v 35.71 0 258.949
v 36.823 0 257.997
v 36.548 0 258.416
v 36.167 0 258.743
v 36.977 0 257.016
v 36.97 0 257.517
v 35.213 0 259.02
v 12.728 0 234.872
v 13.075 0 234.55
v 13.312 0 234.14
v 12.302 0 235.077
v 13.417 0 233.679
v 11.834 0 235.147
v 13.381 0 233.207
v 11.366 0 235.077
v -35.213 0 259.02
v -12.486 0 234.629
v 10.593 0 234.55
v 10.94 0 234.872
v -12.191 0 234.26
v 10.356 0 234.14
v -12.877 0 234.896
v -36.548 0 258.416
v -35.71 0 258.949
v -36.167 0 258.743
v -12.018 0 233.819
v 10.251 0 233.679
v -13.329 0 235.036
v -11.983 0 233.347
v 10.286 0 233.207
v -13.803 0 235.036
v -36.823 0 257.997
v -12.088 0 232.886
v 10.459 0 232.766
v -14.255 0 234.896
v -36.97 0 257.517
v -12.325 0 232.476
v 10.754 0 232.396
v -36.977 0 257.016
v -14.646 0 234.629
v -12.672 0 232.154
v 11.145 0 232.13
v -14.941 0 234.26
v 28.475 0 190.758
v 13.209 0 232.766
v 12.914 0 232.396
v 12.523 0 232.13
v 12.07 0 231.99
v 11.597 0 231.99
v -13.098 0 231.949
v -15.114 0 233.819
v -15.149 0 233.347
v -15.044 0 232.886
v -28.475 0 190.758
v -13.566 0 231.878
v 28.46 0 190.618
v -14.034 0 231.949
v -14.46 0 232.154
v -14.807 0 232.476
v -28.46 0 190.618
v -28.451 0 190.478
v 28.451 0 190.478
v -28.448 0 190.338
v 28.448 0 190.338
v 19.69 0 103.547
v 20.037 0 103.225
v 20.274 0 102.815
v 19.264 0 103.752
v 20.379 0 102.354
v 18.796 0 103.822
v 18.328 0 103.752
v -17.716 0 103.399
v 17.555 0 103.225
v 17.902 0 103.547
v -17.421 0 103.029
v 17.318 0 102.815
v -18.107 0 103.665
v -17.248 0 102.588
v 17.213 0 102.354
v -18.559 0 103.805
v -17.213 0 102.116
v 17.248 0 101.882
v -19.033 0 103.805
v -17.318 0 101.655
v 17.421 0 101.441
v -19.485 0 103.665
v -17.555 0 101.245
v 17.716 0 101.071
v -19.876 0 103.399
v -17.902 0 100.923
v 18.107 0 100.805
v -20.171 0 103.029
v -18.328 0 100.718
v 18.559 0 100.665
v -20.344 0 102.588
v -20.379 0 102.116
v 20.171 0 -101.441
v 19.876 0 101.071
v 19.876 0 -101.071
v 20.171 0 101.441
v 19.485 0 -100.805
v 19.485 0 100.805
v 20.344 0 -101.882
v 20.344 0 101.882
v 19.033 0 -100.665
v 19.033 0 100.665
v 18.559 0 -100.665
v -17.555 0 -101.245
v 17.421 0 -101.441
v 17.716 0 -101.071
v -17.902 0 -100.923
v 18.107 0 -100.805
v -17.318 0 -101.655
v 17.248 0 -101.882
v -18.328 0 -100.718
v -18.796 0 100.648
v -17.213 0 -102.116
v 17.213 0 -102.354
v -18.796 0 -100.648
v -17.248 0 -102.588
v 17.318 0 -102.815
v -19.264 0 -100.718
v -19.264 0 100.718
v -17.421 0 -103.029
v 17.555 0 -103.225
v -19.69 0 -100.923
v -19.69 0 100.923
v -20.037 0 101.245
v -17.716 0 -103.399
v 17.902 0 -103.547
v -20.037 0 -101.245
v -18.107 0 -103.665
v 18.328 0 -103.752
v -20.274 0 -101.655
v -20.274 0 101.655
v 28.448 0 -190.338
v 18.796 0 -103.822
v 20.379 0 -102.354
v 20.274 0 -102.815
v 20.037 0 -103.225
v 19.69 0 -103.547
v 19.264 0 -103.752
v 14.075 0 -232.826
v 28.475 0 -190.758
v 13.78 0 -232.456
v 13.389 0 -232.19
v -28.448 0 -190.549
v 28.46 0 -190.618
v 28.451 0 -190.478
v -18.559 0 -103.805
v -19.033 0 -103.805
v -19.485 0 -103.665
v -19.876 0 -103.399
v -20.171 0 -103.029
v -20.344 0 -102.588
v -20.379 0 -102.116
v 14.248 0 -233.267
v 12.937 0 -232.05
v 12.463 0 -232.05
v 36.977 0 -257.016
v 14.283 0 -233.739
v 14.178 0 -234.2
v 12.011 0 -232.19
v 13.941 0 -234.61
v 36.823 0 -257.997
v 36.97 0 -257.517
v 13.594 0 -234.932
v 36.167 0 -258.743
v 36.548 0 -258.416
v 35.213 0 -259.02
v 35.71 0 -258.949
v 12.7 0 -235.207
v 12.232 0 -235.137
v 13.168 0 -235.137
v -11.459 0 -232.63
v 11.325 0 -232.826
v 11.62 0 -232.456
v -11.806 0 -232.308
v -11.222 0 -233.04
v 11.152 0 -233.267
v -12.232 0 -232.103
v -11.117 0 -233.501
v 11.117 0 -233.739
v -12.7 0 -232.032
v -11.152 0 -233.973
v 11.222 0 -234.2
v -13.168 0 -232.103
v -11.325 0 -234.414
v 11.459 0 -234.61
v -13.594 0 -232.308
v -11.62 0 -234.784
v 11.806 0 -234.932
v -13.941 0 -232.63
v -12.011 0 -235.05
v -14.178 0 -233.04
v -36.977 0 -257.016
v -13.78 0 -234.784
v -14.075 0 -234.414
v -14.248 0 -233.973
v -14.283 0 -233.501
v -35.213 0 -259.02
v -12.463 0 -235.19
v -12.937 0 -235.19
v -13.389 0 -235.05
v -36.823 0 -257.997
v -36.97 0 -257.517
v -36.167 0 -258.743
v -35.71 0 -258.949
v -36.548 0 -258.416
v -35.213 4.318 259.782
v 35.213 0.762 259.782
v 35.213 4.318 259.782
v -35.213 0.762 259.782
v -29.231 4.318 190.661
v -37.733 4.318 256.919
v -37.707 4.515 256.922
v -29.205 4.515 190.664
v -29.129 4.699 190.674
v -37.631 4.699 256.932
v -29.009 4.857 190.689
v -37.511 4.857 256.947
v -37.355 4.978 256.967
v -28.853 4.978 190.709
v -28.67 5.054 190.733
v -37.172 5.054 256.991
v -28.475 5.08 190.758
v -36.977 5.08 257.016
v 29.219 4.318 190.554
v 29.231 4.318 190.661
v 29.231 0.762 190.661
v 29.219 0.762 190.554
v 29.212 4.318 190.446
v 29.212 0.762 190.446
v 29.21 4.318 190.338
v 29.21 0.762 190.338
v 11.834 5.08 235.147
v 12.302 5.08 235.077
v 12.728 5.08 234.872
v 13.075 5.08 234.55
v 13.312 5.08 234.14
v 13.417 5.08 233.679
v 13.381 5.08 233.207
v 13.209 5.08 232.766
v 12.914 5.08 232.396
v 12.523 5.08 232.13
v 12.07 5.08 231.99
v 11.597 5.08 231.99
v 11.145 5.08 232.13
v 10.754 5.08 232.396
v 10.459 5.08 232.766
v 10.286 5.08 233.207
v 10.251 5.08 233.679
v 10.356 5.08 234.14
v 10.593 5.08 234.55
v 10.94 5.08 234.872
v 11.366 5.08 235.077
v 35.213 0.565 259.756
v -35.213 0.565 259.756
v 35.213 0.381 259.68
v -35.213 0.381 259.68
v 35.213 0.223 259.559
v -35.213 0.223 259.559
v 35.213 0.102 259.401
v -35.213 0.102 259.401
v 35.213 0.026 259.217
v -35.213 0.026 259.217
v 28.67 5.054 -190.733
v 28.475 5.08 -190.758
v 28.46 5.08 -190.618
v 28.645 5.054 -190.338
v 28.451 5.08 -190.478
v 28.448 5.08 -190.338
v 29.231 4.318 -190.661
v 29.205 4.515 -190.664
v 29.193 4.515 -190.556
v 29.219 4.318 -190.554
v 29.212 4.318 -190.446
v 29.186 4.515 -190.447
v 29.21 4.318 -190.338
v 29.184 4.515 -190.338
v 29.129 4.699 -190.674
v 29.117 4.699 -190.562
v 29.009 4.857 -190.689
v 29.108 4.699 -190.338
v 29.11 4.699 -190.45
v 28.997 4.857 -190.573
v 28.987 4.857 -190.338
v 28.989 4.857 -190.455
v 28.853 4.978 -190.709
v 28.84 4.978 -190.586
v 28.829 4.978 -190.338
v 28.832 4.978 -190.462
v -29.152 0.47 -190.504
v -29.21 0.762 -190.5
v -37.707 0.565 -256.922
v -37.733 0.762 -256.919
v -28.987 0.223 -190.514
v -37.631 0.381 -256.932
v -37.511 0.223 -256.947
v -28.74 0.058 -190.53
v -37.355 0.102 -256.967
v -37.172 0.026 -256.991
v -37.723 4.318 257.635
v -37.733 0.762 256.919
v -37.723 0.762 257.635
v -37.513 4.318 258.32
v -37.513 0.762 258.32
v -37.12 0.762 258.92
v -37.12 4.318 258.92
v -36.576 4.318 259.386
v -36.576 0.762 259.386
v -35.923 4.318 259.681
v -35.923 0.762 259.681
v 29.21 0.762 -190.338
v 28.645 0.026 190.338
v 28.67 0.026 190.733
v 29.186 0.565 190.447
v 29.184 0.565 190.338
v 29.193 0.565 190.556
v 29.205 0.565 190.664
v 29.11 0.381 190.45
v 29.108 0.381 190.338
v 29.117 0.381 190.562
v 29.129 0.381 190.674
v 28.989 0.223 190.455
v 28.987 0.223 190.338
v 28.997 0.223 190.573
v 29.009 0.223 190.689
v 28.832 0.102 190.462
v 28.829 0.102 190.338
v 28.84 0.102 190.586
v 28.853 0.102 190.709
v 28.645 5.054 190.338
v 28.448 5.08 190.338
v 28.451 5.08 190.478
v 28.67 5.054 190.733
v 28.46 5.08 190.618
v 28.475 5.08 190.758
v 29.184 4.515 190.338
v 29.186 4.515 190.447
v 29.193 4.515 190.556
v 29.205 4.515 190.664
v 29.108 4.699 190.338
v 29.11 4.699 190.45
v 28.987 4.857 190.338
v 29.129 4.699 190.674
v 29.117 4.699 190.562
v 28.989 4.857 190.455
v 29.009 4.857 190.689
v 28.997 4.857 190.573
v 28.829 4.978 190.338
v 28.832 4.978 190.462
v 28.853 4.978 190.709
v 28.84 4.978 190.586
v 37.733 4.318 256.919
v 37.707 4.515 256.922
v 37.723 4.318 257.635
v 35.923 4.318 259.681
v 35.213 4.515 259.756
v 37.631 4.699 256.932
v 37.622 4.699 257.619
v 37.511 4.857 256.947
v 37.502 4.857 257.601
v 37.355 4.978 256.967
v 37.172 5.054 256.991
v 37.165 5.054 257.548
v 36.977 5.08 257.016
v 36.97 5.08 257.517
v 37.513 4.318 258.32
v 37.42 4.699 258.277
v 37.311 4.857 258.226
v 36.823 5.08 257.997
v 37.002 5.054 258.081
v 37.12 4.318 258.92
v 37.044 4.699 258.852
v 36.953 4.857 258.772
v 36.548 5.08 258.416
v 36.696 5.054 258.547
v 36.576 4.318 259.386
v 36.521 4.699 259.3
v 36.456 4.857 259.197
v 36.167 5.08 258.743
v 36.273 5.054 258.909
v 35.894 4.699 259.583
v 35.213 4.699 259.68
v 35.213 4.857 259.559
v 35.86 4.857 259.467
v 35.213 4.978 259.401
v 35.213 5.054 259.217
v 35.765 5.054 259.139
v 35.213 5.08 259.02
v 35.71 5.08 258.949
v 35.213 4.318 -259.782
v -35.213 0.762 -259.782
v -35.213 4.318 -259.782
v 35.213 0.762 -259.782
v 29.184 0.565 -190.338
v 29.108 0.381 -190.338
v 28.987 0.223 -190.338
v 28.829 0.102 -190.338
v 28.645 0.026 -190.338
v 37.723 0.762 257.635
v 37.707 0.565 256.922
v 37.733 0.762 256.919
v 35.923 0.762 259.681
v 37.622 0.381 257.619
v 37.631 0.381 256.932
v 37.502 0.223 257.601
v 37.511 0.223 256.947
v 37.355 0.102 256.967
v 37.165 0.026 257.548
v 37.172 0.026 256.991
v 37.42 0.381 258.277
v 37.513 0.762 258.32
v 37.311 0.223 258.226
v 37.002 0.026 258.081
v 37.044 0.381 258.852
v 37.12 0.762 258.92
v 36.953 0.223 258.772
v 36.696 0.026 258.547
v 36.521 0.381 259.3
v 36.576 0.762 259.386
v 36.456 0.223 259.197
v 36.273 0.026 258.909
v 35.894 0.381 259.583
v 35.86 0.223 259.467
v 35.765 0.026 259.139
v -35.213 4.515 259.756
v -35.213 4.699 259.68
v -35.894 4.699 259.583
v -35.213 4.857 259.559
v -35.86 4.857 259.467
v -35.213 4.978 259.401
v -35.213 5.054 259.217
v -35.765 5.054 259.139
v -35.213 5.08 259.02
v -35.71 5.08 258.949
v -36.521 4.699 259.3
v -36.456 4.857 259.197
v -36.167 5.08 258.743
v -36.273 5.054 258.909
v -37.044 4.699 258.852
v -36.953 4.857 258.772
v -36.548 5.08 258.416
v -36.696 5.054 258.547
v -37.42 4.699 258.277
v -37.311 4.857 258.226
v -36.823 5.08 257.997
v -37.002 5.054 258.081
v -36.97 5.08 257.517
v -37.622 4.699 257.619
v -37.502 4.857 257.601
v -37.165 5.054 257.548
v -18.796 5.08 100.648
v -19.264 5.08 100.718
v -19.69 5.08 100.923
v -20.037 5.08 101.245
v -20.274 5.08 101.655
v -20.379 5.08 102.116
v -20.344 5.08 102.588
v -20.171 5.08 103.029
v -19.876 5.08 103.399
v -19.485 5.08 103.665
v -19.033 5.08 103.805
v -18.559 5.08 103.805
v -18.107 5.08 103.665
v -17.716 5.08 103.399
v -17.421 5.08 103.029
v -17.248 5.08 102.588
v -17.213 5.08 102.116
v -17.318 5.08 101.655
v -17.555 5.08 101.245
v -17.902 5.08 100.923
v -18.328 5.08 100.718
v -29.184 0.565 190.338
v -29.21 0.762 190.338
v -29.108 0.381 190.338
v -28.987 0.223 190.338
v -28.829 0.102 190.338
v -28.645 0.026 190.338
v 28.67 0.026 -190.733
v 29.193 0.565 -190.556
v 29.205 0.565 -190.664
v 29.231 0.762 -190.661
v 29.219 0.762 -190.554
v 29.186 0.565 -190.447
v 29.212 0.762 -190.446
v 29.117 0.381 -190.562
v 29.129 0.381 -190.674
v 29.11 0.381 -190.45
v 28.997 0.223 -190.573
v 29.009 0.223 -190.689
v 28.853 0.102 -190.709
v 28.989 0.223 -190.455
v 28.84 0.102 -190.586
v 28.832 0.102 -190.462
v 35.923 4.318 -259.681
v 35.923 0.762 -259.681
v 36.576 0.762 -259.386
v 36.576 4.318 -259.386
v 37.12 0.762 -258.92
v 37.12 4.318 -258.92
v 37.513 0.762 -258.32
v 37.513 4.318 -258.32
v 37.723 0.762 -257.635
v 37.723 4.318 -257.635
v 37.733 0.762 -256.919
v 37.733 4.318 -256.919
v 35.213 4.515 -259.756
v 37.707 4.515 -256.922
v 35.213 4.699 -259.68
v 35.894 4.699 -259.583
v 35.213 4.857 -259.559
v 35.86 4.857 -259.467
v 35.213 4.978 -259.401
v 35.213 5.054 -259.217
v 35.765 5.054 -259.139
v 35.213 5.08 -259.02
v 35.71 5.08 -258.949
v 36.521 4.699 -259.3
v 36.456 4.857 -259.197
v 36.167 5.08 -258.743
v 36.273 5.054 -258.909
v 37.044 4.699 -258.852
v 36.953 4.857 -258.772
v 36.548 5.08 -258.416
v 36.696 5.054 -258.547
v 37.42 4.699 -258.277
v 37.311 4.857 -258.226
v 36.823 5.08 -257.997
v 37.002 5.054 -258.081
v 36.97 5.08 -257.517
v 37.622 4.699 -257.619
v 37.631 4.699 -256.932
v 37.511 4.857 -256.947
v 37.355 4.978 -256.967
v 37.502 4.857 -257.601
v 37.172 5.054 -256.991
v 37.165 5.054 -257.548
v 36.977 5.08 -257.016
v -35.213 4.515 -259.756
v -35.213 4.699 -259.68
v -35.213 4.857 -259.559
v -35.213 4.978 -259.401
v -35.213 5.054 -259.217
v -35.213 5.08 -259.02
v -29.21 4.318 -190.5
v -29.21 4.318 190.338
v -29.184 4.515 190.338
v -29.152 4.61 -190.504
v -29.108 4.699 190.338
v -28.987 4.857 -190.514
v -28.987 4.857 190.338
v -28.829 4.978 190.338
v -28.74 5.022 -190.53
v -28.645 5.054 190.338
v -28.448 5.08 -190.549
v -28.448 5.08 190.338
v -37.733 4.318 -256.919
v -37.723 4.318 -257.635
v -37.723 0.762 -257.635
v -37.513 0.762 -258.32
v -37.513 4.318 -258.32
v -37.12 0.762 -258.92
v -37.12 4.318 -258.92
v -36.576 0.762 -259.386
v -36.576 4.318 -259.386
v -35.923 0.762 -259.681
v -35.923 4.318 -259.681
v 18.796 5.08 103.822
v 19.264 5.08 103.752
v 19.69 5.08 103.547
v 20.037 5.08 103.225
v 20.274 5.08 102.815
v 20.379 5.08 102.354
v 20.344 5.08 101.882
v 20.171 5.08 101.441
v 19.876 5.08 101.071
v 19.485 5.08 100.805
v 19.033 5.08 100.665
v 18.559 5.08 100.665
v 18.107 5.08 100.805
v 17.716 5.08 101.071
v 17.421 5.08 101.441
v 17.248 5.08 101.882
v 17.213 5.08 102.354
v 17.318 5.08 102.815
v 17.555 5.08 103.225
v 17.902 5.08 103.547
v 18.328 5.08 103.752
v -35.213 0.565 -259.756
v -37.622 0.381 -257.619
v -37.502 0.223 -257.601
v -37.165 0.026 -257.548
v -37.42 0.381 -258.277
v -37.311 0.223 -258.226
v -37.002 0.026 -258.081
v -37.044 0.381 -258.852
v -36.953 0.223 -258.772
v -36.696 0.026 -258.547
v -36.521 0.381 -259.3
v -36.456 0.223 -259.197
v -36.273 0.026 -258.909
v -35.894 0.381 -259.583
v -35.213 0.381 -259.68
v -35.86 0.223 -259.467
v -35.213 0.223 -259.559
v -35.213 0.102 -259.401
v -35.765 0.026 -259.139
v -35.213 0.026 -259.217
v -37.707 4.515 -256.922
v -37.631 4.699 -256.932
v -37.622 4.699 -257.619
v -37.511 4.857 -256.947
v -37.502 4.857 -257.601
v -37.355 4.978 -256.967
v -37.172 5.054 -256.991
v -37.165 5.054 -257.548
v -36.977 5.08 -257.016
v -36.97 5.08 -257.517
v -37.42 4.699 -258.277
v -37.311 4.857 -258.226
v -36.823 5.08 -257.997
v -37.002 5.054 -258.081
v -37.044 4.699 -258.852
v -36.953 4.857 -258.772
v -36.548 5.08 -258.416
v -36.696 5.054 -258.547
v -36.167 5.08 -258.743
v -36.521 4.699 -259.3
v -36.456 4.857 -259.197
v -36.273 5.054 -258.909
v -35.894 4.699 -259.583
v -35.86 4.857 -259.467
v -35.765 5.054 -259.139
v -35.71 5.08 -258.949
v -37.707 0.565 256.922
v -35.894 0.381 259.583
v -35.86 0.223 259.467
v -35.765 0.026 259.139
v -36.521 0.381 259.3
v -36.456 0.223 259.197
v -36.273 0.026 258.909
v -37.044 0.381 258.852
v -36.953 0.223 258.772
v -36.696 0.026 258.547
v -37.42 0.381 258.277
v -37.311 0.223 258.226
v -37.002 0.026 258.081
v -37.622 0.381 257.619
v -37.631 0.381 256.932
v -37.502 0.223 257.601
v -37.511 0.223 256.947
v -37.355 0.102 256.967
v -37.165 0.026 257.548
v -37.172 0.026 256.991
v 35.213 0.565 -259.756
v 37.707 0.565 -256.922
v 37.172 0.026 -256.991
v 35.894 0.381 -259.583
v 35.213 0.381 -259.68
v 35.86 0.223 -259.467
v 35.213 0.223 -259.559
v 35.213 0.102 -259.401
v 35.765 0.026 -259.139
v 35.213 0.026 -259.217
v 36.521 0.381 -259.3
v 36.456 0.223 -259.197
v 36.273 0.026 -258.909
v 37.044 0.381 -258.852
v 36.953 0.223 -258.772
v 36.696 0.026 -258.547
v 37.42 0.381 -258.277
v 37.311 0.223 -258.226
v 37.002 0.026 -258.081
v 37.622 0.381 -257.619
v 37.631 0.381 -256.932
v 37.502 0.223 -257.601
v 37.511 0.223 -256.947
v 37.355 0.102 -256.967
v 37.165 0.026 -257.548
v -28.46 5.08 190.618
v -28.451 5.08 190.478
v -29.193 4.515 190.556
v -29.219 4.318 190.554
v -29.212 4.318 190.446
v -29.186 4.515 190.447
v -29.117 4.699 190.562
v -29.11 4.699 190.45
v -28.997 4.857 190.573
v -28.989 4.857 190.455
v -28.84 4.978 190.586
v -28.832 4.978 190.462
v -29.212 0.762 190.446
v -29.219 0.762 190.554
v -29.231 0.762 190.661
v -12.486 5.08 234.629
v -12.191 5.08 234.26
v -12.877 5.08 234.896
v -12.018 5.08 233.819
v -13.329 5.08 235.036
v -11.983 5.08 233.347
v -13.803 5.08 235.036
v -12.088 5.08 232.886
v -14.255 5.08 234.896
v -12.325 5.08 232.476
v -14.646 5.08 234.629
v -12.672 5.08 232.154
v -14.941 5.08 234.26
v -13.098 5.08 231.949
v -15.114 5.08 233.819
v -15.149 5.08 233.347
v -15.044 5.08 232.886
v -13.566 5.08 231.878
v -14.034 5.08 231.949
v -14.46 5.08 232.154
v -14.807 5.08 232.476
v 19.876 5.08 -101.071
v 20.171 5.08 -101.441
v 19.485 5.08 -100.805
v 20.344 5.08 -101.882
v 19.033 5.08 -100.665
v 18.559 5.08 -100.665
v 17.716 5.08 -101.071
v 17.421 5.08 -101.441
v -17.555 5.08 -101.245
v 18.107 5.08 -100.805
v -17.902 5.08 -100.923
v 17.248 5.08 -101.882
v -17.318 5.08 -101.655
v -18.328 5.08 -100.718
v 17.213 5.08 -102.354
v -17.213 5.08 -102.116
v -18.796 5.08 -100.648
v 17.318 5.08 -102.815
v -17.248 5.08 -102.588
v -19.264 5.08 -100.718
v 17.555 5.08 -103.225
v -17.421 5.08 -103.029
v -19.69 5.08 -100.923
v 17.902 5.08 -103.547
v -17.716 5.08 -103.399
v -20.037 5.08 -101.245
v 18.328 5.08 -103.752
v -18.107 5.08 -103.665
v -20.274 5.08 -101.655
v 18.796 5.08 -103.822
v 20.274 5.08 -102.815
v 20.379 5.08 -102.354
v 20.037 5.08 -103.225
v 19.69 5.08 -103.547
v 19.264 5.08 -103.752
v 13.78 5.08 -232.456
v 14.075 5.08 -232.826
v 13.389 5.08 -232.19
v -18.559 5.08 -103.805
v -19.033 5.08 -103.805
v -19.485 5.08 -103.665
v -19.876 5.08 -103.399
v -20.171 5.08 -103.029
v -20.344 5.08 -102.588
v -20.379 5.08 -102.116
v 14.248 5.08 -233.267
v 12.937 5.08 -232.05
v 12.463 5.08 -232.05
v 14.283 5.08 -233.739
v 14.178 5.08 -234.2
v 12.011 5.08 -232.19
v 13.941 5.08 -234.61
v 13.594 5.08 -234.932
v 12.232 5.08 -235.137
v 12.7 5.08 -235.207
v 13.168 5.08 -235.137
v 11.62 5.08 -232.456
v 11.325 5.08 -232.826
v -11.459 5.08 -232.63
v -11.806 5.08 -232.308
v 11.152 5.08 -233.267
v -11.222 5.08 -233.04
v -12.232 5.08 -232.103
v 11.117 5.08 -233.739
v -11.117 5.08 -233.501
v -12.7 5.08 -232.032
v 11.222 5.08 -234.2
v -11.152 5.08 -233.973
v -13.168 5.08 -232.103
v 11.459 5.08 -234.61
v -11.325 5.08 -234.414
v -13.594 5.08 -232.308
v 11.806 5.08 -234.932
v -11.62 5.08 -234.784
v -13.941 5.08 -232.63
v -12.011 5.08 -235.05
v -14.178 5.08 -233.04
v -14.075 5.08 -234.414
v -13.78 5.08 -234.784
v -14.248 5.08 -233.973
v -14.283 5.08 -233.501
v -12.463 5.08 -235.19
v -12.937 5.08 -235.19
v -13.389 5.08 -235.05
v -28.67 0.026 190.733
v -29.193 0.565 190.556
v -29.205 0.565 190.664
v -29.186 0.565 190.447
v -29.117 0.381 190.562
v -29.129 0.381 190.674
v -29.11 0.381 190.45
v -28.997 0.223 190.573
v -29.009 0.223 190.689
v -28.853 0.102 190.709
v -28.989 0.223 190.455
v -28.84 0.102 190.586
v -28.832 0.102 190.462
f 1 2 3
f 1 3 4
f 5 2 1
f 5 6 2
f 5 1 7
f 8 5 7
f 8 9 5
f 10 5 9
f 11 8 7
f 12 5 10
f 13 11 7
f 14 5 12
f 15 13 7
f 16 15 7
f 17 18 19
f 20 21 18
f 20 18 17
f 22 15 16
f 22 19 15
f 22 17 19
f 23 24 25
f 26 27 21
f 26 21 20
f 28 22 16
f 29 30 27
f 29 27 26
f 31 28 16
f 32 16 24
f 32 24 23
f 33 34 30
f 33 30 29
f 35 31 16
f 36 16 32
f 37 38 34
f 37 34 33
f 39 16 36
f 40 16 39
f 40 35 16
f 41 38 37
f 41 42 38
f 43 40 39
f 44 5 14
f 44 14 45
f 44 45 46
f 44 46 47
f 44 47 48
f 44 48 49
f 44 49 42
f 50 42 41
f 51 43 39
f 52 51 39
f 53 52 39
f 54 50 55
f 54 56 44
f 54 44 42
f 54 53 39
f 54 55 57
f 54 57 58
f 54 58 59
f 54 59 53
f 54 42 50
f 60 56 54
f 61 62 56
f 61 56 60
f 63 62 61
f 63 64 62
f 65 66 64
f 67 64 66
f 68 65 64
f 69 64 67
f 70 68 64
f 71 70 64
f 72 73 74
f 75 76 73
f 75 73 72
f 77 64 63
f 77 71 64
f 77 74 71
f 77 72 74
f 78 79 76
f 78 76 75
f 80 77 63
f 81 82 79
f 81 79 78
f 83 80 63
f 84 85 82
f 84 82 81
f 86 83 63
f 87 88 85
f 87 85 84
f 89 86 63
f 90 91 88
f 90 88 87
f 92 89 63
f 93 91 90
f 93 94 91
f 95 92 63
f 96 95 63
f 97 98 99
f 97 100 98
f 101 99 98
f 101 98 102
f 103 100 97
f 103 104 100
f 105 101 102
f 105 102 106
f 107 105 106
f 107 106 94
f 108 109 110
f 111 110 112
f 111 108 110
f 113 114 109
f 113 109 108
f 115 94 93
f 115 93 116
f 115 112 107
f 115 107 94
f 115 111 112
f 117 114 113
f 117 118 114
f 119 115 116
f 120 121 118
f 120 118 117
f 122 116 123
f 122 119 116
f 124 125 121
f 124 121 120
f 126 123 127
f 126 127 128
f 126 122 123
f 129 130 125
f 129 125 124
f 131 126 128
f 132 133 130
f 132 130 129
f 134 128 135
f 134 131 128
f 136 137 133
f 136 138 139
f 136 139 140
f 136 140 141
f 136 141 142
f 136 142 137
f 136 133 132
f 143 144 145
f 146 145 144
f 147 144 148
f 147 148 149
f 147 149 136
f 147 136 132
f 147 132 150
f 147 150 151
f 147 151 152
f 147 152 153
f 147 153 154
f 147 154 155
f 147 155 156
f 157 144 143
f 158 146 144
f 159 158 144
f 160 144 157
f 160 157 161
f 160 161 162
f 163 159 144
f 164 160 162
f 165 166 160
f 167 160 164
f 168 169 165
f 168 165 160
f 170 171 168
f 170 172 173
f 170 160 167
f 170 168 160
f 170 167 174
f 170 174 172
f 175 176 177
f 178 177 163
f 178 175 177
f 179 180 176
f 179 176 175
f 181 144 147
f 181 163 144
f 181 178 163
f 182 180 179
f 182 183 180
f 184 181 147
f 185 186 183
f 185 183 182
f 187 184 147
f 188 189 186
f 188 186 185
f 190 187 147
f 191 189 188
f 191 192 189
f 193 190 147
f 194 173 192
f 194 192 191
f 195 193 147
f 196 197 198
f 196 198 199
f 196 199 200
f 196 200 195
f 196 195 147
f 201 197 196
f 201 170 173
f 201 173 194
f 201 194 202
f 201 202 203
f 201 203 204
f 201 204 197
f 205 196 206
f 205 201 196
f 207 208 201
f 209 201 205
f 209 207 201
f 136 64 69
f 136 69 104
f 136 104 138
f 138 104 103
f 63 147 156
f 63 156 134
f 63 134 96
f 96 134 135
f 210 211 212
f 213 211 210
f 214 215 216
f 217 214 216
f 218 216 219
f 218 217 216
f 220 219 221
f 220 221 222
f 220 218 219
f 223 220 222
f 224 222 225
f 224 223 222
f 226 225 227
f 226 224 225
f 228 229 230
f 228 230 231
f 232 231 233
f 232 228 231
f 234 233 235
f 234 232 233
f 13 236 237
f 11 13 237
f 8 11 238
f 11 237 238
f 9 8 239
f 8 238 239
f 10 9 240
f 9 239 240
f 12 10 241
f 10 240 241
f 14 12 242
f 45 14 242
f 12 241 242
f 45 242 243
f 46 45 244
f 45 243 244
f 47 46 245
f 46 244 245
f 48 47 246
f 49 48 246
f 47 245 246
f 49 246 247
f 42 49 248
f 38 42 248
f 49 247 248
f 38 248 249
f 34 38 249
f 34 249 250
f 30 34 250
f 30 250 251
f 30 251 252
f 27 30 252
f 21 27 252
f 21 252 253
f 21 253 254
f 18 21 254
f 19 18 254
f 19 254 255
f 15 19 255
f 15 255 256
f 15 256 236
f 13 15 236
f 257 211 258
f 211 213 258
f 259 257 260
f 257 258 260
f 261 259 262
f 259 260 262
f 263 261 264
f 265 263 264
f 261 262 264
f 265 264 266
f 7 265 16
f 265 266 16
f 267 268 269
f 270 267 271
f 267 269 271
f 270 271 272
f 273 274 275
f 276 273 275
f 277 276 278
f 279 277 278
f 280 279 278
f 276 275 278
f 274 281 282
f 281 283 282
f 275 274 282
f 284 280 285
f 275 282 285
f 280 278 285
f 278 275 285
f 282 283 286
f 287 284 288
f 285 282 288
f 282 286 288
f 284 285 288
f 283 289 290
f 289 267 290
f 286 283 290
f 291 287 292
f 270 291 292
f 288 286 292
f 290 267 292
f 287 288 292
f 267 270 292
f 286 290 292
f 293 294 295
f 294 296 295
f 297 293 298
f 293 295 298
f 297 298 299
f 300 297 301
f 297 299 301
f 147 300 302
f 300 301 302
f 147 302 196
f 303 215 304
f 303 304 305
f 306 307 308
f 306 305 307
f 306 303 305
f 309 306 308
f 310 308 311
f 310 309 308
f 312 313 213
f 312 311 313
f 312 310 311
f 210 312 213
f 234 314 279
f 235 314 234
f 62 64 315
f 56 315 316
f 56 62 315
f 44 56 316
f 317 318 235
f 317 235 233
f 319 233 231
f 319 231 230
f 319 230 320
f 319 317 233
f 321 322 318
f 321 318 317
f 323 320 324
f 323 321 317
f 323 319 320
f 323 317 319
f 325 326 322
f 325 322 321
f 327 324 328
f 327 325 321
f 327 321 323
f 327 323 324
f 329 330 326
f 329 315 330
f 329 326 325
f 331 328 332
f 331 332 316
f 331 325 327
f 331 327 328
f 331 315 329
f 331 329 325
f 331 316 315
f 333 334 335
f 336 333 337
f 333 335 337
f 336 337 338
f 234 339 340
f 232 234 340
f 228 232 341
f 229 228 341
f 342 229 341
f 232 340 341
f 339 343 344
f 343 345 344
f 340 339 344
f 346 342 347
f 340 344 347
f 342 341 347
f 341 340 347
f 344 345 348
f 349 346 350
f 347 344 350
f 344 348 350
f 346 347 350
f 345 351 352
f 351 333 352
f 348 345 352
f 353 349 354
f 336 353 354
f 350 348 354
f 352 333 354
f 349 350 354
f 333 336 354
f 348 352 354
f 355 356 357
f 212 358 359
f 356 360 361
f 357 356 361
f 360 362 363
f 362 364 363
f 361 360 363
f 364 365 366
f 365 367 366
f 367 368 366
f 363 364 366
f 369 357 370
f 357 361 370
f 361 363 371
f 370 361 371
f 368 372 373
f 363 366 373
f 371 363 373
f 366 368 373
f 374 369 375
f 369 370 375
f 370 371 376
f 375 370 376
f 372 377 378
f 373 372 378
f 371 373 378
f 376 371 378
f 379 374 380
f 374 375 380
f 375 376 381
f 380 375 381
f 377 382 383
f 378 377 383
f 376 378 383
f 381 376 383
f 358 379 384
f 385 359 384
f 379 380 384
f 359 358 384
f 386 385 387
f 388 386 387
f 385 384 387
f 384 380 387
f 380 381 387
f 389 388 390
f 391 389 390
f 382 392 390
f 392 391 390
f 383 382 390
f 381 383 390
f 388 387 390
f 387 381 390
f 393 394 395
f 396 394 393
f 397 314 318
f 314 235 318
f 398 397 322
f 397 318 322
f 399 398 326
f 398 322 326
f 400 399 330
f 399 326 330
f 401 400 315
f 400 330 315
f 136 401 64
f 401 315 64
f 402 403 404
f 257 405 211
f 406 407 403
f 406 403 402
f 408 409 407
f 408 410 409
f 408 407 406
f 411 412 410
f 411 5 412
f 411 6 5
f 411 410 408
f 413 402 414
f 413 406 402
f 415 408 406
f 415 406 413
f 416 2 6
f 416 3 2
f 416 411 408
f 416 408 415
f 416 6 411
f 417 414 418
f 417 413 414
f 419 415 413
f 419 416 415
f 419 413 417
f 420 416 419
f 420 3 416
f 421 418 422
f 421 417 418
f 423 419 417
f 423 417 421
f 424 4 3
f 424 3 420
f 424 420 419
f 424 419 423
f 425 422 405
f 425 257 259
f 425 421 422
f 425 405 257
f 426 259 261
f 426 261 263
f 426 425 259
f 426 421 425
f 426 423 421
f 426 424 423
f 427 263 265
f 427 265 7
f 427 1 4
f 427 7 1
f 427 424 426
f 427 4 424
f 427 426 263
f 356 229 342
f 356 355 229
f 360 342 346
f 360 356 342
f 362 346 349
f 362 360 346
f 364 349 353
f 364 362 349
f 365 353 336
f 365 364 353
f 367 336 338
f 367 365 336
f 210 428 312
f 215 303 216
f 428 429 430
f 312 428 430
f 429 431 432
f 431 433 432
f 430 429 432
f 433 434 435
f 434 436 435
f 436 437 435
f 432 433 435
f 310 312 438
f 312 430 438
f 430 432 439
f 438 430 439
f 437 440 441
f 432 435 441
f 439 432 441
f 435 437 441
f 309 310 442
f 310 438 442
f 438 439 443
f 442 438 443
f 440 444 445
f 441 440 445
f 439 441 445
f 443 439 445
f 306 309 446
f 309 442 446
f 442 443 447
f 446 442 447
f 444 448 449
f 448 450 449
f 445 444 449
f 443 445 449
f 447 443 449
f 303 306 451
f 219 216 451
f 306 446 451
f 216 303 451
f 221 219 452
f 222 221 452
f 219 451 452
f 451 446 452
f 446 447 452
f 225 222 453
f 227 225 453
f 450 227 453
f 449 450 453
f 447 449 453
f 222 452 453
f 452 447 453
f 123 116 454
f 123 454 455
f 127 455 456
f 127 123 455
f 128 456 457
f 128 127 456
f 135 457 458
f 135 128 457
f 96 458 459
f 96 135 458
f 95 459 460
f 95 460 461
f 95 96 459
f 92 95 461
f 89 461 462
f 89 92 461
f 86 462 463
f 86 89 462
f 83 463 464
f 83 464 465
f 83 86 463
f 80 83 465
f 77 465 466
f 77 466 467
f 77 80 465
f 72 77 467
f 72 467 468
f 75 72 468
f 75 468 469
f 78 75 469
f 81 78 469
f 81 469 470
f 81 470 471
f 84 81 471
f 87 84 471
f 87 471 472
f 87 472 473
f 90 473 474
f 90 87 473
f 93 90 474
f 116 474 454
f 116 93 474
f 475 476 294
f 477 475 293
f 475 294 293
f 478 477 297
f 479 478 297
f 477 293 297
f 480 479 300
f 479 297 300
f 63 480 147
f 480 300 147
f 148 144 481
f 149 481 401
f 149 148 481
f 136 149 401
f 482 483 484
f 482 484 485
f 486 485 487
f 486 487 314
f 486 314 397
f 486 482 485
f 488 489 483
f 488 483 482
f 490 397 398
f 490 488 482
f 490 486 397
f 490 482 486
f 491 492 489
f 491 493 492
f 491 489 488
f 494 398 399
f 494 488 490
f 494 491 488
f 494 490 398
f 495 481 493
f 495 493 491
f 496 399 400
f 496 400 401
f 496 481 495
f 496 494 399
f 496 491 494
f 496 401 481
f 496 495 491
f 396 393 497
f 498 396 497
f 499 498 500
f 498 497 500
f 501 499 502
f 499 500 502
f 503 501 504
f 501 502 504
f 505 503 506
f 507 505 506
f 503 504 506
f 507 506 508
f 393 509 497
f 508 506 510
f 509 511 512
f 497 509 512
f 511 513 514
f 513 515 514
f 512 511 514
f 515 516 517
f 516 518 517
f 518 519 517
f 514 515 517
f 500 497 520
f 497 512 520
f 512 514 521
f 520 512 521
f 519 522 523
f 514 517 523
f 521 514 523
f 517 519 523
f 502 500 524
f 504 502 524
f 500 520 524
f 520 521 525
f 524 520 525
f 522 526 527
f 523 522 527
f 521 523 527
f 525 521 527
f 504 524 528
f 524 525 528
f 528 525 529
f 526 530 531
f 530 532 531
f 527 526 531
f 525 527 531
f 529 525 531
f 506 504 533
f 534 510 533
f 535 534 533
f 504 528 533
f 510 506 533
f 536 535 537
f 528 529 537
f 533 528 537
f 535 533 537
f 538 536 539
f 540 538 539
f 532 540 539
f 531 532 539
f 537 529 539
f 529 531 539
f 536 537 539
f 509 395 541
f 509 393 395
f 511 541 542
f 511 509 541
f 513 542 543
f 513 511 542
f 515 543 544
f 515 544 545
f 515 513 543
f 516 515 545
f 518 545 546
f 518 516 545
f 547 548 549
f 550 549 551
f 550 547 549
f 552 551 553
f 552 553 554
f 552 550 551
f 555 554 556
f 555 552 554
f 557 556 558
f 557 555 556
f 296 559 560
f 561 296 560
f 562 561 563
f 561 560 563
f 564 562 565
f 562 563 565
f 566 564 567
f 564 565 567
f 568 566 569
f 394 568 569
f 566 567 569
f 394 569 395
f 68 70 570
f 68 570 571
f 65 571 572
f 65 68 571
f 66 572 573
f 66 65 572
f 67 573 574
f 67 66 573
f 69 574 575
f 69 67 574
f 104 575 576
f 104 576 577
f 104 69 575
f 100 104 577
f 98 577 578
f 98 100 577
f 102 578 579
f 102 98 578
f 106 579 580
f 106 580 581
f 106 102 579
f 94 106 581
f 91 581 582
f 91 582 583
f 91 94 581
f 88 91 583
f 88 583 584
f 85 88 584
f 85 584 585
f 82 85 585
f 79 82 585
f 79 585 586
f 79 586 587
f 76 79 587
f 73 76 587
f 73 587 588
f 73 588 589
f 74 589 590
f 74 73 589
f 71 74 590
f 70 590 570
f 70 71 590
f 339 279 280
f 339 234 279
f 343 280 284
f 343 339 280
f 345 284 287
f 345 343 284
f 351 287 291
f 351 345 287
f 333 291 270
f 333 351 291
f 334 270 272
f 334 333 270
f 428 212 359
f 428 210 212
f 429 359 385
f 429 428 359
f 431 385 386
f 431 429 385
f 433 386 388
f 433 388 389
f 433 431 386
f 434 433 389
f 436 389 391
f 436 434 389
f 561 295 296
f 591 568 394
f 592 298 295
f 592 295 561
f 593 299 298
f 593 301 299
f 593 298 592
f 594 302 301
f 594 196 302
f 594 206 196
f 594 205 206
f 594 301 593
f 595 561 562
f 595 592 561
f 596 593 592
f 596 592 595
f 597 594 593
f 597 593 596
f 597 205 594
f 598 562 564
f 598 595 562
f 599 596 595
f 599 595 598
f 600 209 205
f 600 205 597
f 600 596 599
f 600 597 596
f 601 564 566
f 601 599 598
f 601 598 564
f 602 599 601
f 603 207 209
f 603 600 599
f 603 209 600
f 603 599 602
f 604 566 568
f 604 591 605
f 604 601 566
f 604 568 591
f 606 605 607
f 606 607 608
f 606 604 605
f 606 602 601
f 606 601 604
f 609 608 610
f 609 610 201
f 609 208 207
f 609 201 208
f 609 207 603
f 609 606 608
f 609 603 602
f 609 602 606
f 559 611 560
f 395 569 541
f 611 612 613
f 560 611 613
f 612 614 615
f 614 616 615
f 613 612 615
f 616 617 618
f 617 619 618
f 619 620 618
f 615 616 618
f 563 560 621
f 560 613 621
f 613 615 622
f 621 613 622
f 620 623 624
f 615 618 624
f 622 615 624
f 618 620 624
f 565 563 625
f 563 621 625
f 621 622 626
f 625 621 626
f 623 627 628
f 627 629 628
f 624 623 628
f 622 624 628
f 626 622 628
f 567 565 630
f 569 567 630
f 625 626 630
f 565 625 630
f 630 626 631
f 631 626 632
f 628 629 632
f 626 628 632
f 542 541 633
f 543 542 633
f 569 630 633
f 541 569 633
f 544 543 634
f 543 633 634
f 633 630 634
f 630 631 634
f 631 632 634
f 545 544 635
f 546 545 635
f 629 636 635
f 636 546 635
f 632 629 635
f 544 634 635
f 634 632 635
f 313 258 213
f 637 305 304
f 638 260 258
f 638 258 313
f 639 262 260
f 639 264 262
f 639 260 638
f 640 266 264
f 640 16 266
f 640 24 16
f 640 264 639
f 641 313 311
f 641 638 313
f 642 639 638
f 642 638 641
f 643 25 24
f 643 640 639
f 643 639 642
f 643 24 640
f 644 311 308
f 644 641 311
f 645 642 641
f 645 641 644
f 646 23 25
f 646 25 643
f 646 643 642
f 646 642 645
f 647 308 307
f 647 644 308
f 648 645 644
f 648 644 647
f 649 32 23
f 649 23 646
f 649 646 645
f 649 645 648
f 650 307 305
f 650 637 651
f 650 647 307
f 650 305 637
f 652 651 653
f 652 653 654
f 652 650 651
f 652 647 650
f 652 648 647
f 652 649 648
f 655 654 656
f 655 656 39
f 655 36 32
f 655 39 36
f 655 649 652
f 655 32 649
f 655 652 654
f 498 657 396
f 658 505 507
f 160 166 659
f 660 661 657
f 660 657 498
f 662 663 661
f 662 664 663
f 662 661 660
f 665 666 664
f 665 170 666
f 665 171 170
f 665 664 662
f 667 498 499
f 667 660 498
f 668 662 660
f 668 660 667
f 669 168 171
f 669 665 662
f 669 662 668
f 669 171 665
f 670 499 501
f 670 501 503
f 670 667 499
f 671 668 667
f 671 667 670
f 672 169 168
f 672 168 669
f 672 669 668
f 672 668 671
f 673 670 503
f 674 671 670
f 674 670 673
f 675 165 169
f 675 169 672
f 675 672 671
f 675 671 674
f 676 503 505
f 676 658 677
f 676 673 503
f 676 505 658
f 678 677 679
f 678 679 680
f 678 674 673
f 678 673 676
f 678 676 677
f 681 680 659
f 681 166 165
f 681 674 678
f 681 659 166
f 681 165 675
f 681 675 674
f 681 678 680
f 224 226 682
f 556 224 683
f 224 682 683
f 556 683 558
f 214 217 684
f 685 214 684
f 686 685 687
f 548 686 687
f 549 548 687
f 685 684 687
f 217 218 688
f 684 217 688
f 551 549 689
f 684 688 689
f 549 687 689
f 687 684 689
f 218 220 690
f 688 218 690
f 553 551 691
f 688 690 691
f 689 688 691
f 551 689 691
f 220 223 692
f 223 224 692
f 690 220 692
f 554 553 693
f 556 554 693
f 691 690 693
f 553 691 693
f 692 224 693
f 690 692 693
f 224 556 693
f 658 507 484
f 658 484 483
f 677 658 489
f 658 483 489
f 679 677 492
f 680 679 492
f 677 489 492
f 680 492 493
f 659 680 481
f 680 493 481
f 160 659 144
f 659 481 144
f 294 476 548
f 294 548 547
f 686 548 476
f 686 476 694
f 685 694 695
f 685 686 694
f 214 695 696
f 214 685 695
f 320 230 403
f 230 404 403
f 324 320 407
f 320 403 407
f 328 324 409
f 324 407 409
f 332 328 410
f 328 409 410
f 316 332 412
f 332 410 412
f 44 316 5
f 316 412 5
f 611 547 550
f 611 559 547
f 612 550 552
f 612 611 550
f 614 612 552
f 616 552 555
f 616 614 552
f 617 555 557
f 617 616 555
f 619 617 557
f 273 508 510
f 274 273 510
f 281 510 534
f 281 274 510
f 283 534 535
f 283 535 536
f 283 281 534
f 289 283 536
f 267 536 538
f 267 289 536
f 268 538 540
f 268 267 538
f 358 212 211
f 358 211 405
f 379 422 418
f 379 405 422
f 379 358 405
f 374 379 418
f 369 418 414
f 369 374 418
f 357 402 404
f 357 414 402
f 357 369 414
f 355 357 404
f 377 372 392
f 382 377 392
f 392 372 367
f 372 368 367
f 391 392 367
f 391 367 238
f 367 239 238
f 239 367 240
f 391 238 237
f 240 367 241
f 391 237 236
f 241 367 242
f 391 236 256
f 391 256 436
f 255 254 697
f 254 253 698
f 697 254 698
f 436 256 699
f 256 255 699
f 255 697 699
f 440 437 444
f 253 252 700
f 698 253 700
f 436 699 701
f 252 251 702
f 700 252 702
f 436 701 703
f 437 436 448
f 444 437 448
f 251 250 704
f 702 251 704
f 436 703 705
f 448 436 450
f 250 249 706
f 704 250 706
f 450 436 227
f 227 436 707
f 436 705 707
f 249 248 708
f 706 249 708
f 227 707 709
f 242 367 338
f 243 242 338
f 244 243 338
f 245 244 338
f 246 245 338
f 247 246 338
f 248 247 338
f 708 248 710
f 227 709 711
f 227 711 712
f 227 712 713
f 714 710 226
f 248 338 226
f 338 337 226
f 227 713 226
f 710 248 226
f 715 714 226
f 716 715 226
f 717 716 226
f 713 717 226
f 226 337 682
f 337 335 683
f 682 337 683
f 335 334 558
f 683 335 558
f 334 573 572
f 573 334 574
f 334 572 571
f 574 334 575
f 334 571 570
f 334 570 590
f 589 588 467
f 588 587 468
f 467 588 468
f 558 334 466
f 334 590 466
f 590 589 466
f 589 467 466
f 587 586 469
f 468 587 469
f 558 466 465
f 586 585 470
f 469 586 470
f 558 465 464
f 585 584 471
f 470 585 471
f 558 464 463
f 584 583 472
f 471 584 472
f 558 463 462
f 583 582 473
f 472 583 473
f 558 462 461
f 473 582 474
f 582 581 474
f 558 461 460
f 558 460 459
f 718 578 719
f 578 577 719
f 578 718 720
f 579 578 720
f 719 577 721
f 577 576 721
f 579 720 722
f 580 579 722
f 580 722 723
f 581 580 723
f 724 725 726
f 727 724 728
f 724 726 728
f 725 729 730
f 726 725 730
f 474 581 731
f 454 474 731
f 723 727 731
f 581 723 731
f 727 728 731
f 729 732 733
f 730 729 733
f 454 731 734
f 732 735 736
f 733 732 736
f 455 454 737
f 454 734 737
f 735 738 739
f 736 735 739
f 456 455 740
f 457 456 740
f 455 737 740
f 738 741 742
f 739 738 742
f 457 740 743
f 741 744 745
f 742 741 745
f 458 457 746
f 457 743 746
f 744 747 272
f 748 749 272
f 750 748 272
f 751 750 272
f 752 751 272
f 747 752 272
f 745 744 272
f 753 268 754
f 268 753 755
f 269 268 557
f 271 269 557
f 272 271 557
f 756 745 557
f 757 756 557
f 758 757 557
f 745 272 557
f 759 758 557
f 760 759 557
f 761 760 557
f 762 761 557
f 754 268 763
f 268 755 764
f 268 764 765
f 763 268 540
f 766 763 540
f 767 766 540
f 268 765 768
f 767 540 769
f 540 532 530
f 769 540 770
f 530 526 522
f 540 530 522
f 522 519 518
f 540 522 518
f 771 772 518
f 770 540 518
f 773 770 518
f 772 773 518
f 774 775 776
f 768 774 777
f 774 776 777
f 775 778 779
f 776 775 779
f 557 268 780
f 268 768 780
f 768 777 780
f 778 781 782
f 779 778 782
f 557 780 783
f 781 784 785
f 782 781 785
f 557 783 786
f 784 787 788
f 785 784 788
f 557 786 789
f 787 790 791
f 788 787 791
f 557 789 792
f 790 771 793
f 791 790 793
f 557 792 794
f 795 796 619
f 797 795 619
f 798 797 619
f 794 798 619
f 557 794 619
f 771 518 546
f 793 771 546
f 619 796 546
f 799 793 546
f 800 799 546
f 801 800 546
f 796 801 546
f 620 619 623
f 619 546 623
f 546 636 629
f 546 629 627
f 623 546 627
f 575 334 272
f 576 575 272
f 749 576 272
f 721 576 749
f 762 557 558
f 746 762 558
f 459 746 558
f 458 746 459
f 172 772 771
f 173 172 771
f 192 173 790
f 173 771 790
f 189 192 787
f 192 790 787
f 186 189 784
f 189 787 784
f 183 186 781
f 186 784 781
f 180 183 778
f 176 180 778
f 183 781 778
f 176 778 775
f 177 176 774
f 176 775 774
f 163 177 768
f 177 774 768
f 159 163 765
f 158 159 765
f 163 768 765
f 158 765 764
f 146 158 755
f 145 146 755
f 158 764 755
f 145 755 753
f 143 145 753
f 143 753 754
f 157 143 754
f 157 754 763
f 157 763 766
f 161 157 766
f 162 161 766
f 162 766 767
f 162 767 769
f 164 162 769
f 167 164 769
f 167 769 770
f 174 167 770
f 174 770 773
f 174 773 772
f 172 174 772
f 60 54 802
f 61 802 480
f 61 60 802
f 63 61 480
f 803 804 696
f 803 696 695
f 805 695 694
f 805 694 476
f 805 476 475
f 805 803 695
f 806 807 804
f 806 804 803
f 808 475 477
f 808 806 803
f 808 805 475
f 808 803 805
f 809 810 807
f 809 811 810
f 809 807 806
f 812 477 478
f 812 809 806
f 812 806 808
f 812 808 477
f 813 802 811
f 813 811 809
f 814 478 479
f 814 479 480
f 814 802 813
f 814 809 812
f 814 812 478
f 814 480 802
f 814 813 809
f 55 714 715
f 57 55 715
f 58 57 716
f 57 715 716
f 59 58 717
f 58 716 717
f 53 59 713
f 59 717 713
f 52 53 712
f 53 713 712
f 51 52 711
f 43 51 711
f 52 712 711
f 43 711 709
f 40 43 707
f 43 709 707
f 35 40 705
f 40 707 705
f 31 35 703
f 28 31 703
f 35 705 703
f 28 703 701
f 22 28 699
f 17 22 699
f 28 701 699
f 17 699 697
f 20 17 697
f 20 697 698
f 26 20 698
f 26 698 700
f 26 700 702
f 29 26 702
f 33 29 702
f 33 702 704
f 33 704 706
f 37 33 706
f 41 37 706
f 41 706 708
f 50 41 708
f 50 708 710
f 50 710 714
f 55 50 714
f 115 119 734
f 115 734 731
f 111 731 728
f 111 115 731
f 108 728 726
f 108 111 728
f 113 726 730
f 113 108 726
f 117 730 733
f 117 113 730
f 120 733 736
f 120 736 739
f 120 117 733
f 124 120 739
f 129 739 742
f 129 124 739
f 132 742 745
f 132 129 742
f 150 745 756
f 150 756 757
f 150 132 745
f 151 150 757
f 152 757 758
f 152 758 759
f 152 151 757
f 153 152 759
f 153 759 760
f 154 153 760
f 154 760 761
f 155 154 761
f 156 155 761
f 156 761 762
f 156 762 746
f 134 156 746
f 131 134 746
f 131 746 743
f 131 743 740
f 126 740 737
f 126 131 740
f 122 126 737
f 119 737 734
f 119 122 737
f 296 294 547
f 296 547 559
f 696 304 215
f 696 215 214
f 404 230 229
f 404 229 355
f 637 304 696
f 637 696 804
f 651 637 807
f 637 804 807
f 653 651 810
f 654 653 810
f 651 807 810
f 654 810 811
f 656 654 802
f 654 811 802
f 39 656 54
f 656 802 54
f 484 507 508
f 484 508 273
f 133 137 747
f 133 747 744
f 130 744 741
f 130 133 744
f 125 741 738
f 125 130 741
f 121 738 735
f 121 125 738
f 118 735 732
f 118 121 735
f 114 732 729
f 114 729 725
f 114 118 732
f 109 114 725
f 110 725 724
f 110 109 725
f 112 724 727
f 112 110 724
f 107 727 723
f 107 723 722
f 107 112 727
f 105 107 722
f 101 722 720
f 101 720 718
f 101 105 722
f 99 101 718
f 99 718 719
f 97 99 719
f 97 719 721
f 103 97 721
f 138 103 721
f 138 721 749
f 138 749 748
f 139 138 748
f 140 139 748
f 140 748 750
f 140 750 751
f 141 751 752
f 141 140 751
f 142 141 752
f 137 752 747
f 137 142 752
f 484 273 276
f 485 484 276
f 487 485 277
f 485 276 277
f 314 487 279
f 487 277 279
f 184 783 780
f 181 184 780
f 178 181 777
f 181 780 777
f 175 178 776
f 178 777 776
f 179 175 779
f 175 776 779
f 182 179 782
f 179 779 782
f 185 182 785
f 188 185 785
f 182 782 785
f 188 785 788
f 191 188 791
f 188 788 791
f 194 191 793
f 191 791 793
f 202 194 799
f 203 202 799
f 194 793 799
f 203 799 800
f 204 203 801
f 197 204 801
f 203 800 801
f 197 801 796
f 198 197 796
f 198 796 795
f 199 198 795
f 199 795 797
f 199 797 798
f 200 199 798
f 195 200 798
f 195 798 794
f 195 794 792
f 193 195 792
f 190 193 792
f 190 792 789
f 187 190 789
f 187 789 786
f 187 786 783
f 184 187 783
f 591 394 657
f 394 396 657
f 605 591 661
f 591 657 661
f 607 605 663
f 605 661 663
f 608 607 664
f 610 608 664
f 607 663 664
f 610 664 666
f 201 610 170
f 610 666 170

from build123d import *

# Parameters (mm, degrees)
SKETCH1_R           = 1.5875
BOSS_EXTRUDE1_DEPTH = 5.08
FILLET1_R           = 2.54
FILLET2_R           = 0.762
SKETCH2_R           = 1.5875
CUT_EXTRUDE1_DEPTH  = 263.560055455


with BuildPart() as part:
    # Sketch1 → Boss-Extrude1 (new body)
    with BuildSketch(Plane(origin=(0, 0, 0), x_dir=(1, 0, 0), z_dir=(0, 1, 0))):
        Polygon((-29.21, -190.5), (-29.21, 190.5), (-38.1, 259.781963021), (38.1, 259.781963021), (29.21, 190.5), (29.21, -190.5), (38.1, -259.781963021), (-38.1, -259.781963021), align=None)
        with Locations(Location((-18.796, 102.235, 0), (0, 0, 270))):
            Circle(SKETCH1_R, mode=Mode.SUBTRACT)
        with Locations(Location((18.796, 102.235, 0), (0, 0, 90))):
            Circle(SKETCH1_R, mode=Mode.SUBTRACT)
        with Locations(Location((18.796, -102.235, 0), (0, 0, 270))):
            Circle(SKETCH1_R, mode=Mode.SUBTRACT)
        with Locations(Location((-18.796, -102.235, 0), (0, 0, 90))):
            Circle(SKETCH1_R, mode=Mode.SUBTRACT)
    extrude(amount=BOSS_EXTRUDE1_DEPTH)

    # Fillet1
    fillet1_edges = [part.edges().sort_by_distance(p)[0] for p in [
        (29.21, 2.54, -190.5),
        (29.21, 2.54, 190.5),
        (38.1, 2.54, 259.781963021),
        (-38.1, 2.54, 259.781963021),
        (-29.21, 2.54, 190.5),
        (-38.1, 2.54, -259.781963021),
        (38.1, 2.54, -259.781963021),
    ]]
    fillet(fillet1_edges, radius=FILLET1_R)

    # Fillet2
    fillet2_edges = [part.edges().sort_by_distance(p)[0] for p in [
        (-29.21, 0, -0.08114814),
        (-29.21, 5.08, -0.08114814),
        (-33.471297825, 0, -223.709345147),
        (-33.471297825, 5.08, -223.709345147),
        (33.48162577, 0, -223.78983337),
        (29.21, 0, 0),
        (33.48162577, 0, 223.78983337),
        (0, 0, 259.781963021),
        (-33.48162577, 0, 223.78983337),
        (0, 0, -259.781963021),
        (37.120174812, 0, -258.919831799),
        (37.120174812, 0, 258.919831799),
        (-37.120174812, 0, 258.919831799),
        (-37.120174812, 0, -258.919831799),
        (0, 5.08, -259.781963021),
        (33.48162577, 5.08, -223.78983337),
        (-33.48162577, 5.08, 223.78983337),
        (0, 5.08, 259.781963021),
        (33.48162577, 5.08, 223.78983337),
        (29.21, 5.08, 0),
        (37.120174812, 5.08, -258.919831799),
        (37.120174812, 5.08, 258.919831799),
        (-37.120174812, 5.08, 258.919831799),
        (-37.120174812, 5.08, -258.919831799),
        (-29.215169233, 0, 190.499669706),
        (-29.215169233, 5.08, 190.499669706),
        (29.215169233, 0, 190.499669706),
        (29.215169233, 5.08, 190.499669706),
        (29.215169233, 0, -190.499669706),
        (29.215169233, 5.08, -190.499669706),
    ]]
    fillet(fillet2_edges, radius=FILLET2_R)

    # Sketch2 → Cut-Extrude1 (cut, through all)
    with BuildSketch(Plane(origin=(0, 5.08, 0), x_dir=(1, 0, 0), z_dir=(0, 1, 0))):
        with Locations(Location((-12.7, 233.619963021, 0), (0, 0, 270))):
            Circle(SKETCH2_R)
        with Locations(Location((12.7, 233.619963021, 0), (0, 0, 90))):
            Circle(SKETCH2_R)
        with Locations(Location((11.833787679, -233.559959271, 0), (0, 0, 270))):
            Circle(SKETCH2_R)
        with Locations(Location((-13.566037681, -233.46576979, 0), (0, 0, 90))):
            Circle(SKETCH2_R)
    extrude(amount=-CUT_EXTRUDE1_DEPTH, mode=Mode.SUBTRACT)


solid = part.part
